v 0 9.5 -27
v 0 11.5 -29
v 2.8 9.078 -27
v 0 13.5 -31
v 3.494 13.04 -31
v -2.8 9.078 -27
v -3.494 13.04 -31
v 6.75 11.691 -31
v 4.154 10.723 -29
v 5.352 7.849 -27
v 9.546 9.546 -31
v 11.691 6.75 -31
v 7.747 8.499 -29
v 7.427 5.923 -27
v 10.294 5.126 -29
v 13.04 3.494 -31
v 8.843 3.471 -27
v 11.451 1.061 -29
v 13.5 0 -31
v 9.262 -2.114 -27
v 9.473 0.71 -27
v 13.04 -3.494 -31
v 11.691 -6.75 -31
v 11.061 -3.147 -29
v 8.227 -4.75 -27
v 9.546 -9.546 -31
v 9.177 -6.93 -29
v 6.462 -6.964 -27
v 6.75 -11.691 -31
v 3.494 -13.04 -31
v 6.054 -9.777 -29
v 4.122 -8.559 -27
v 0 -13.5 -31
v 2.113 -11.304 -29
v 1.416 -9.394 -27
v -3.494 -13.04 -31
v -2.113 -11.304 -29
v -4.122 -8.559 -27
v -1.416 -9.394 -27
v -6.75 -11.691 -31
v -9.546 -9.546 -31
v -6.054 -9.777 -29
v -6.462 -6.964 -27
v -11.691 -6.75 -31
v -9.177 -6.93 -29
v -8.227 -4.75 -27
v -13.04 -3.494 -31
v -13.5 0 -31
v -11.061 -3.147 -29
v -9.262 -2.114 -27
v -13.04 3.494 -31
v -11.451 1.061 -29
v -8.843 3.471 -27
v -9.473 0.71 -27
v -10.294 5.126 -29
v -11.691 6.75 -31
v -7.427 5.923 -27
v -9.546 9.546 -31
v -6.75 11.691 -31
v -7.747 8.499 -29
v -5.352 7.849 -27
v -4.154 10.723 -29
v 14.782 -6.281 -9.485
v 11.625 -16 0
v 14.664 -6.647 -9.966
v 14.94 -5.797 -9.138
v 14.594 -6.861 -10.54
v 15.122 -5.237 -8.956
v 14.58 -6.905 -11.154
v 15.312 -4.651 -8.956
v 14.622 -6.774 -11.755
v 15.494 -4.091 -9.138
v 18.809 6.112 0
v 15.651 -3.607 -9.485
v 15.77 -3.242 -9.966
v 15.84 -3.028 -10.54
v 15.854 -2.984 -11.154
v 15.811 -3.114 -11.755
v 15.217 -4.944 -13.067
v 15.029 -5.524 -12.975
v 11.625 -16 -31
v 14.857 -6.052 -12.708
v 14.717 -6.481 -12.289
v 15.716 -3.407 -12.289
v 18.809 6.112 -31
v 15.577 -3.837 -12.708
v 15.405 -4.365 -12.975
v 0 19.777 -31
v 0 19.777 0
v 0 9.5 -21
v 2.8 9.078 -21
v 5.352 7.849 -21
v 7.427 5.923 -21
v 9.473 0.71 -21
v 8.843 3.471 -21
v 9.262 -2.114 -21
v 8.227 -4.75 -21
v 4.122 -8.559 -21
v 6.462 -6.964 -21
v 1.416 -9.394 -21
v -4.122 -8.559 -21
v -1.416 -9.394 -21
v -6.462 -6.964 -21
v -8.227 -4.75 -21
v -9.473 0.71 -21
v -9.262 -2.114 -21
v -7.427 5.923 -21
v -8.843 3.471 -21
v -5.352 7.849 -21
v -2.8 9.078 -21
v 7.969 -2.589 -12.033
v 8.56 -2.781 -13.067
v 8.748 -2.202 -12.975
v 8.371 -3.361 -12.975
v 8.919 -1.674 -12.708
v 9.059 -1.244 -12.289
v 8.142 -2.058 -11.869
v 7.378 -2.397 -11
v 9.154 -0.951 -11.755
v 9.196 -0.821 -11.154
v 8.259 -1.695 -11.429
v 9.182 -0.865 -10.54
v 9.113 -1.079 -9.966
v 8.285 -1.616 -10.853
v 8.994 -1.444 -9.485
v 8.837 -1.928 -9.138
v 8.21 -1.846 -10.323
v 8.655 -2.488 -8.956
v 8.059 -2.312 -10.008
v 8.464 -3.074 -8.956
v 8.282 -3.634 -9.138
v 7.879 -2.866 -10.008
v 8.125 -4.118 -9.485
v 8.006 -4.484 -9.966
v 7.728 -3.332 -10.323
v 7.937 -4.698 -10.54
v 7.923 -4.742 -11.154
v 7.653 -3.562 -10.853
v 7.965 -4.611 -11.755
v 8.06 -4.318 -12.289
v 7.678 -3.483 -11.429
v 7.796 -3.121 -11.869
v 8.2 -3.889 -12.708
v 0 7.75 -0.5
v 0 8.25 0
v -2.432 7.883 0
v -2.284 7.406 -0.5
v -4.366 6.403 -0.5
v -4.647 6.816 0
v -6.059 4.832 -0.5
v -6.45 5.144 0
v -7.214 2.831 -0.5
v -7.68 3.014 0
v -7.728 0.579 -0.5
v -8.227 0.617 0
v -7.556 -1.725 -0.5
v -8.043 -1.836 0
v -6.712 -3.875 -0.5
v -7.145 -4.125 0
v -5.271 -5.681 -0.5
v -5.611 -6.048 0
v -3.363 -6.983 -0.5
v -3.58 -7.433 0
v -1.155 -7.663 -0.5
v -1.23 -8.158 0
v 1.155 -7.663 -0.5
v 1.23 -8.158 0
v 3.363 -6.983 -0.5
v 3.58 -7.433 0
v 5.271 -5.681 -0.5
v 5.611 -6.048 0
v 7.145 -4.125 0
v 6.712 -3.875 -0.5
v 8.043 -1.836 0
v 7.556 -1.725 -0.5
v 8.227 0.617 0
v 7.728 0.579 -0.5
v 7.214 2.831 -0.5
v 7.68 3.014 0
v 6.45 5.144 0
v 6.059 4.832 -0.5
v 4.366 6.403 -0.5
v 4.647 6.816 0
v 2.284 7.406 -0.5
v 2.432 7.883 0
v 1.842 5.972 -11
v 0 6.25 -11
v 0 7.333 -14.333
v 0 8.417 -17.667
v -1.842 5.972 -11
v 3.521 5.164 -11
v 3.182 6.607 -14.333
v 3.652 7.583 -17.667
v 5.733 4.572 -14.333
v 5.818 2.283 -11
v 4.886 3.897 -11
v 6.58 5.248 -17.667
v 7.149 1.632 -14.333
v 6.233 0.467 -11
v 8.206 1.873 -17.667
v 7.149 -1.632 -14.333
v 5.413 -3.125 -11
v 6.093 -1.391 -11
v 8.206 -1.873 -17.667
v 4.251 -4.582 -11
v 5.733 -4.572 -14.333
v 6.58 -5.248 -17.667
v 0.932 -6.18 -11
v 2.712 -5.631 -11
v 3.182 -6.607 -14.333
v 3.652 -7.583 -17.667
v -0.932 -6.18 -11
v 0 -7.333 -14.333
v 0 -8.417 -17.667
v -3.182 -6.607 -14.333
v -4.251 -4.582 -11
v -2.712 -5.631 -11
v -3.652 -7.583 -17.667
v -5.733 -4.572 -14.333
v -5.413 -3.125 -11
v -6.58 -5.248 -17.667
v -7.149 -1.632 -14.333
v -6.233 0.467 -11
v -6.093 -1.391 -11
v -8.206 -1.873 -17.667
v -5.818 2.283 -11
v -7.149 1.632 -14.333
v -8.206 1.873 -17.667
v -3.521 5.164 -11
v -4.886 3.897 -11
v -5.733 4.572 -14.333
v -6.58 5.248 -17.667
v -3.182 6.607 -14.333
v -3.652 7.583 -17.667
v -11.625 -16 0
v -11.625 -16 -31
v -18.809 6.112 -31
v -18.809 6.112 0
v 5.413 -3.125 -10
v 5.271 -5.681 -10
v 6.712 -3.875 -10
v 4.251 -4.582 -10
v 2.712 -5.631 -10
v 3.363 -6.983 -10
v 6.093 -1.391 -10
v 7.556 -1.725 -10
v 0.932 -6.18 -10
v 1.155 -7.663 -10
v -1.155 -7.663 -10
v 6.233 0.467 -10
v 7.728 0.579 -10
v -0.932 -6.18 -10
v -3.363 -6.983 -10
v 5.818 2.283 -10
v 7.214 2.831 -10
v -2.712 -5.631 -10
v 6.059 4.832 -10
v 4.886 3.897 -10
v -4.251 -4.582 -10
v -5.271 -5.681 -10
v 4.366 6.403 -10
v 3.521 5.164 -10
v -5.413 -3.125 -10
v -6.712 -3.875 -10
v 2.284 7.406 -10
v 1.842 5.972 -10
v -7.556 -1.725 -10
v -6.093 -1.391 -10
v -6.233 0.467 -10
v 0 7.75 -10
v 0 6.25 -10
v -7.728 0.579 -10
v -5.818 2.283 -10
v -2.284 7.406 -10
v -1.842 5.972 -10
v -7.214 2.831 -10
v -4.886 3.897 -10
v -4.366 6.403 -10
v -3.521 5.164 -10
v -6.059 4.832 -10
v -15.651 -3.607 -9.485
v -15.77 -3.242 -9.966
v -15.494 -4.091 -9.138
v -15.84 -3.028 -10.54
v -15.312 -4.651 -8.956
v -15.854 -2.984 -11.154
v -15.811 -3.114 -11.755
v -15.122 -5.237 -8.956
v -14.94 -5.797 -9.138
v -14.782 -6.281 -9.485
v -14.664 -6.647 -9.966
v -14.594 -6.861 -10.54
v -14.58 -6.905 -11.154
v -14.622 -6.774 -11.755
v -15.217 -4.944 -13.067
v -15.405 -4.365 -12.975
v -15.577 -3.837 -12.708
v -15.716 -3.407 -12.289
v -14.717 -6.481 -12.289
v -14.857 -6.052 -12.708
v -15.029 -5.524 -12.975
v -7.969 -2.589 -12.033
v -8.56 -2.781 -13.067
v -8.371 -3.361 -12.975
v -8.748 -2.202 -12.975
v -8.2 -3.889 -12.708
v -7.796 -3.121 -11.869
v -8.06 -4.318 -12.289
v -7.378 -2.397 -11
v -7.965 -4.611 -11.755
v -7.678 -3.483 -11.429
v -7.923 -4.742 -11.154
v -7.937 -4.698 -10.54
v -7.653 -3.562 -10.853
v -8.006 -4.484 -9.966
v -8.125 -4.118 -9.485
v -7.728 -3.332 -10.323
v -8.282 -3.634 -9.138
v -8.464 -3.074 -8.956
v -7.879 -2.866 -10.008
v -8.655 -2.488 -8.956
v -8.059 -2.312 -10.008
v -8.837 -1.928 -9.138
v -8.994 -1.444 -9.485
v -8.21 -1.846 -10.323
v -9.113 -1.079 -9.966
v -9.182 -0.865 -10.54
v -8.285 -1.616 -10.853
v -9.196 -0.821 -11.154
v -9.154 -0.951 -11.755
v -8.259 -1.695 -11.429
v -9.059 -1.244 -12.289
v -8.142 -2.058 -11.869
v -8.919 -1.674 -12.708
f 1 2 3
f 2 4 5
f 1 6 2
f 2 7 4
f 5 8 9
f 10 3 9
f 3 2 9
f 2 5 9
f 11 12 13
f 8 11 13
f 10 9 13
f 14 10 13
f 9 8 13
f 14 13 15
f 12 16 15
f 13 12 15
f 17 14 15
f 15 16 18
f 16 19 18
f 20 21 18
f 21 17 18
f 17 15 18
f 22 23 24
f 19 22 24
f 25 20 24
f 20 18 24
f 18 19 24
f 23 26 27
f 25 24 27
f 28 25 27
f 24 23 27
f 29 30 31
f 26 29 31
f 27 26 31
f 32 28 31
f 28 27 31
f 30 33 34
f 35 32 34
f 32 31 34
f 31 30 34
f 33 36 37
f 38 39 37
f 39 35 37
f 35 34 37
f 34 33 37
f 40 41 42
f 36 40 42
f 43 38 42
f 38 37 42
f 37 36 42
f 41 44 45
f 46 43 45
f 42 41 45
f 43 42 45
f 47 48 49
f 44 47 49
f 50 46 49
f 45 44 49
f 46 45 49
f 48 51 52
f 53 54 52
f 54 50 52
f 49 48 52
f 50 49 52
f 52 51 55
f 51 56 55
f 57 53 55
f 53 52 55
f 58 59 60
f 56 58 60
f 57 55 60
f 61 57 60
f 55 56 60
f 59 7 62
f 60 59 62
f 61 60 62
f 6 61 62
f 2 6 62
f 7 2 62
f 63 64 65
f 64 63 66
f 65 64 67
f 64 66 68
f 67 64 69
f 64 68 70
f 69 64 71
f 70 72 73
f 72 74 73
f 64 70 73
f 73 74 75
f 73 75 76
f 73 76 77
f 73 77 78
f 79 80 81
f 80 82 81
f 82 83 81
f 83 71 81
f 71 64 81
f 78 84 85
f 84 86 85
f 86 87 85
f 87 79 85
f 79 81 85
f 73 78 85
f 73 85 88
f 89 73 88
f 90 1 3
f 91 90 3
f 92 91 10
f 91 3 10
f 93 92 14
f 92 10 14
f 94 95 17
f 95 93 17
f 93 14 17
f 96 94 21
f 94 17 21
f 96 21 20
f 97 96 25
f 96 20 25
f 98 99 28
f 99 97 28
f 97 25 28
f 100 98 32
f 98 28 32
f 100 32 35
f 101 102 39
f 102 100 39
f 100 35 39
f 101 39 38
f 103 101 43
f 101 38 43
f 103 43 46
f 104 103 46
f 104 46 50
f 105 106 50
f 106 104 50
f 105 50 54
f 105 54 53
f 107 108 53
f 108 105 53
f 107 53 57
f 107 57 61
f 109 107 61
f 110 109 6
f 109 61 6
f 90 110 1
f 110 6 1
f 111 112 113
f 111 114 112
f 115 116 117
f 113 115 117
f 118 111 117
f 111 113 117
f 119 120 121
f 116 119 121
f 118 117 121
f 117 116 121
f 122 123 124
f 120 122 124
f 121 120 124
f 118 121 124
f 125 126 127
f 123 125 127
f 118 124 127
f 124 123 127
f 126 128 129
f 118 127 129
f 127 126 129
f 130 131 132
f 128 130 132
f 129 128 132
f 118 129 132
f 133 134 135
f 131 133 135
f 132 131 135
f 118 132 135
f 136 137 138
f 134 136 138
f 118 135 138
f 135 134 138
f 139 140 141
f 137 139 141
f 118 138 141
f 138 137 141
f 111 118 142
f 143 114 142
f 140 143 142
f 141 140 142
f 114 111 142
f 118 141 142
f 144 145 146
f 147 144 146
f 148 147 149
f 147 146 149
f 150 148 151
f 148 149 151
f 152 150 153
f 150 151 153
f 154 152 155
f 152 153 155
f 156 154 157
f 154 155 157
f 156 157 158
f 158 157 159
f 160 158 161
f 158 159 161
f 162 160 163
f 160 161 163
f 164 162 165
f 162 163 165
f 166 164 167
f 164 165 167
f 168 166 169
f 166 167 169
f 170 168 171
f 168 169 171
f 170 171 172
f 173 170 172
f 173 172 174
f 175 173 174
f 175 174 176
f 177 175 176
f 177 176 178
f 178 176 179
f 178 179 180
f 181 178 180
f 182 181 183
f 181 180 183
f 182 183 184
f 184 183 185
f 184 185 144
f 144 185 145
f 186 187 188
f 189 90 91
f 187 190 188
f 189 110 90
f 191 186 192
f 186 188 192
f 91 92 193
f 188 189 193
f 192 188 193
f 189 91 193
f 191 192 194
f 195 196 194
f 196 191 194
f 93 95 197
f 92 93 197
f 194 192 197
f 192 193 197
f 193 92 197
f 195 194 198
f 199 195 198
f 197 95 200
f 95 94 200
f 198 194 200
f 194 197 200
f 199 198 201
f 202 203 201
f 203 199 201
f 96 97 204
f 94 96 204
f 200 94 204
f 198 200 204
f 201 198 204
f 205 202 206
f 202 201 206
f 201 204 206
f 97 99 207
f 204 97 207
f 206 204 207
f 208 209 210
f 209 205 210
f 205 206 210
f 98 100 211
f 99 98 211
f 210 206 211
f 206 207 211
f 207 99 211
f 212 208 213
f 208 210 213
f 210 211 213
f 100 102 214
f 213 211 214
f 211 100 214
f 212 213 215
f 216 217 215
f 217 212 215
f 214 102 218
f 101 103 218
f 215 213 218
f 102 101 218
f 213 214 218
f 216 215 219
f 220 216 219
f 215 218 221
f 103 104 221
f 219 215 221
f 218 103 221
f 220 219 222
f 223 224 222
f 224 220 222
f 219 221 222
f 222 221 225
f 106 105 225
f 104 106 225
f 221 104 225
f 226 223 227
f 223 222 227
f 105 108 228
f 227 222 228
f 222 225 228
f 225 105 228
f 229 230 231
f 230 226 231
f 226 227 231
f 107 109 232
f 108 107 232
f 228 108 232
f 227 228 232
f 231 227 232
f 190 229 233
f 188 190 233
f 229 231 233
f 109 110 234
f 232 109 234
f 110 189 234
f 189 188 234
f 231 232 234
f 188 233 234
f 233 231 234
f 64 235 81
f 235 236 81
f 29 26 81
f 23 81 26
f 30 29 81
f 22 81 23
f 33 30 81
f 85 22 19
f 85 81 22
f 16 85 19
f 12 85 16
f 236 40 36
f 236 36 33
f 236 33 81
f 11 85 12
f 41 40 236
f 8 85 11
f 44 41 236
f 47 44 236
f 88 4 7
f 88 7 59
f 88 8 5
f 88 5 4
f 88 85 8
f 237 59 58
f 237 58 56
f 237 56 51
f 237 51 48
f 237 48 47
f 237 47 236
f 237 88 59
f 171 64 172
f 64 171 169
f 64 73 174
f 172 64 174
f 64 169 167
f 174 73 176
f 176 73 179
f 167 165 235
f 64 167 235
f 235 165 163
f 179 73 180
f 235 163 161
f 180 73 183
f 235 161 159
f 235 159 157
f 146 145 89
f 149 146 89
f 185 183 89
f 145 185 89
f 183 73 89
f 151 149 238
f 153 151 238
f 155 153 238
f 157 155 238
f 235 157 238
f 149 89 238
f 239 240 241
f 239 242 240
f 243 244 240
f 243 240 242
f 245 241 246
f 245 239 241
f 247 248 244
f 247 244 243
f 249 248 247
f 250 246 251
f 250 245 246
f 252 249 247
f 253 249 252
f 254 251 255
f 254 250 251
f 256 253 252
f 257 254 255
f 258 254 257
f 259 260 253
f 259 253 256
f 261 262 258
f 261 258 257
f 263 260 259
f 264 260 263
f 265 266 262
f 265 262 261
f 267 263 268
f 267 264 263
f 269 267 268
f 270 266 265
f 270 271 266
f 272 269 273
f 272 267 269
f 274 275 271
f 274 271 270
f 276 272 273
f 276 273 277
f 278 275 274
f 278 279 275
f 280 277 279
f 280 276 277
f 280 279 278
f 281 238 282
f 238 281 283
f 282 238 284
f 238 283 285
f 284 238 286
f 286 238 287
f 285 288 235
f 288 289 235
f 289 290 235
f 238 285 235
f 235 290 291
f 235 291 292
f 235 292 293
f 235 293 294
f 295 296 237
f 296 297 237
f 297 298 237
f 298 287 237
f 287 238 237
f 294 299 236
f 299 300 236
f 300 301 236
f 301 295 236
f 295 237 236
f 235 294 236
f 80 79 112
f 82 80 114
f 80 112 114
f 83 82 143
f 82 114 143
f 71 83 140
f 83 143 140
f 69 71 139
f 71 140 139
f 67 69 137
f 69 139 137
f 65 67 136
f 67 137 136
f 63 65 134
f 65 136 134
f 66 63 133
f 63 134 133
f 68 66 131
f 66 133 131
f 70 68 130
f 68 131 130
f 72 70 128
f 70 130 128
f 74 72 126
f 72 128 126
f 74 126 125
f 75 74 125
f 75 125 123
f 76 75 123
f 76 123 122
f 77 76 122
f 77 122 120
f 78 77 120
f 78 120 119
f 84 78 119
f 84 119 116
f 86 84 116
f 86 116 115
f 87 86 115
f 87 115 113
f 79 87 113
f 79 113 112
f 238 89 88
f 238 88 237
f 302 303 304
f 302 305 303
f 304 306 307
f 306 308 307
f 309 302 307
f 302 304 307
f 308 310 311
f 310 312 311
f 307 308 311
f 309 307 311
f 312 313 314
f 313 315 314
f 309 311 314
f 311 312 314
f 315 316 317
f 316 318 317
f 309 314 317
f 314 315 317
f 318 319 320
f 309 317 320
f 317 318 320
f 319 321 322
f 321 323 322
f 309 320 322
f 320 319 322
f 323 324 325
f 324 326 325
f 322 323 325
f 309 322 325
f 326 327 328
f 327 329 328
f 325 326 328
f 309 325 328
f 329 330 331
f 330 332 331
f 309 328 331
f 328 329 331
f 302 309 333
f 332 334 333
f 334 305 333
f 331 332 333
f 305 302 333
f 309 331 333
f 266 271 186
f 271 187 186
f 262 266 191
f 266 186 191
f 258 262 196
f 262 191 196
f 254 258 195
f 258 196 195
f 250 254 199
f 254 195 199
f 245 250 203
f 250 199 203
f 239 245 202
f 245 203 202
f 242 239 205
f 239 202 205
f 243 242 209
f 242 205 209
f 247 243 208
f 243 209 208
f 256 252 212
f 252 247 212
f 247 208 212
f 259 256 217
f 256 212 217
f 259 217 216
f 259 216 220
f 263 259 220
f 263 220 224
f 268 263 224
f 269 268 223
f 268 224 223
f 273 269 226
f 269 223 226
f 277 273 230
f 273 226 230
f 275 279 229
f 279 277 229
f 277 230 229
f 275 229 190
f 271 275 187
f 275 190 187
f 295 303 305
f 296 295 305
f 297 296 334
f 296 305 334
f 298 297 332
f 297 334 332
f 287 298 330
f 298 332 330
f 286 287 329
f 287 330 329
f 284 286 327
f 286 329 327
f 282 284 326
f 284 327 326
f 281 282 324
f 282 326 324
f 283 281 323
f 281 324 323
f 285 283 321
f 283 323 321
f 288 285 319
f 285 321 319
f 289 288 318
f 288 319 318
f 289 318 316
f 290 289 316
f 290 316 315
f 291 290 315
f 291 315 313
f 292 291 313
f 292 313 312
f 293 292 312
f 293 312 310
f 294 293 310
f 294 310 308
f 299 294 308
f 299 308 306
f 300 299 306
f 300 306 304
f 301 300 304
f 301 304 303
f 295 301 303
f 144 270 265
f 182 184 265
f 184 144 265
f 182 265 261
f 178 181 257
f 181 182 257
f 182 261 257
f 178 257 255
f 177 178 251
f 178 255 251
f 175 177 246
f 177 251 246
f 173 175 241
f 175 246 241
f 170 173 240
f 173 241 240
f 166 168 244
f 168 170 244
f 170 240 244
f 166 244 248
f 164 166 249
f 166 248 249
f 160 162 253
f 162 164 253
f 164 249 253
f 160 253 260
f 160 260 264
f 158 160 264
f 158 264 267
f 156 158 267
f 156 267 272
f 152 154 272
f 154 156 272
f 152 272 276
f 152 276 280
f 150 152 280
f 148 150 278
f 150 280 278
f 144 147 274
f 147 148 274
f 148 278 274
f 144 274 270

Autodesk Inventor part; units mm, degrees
ref_plane "YZ Plane" through (0, 0, 0) normal (1, 0, 0) x (0, 1, 0)
ref_plane "XZ Plane" through (0, 0, 0) normal (0, 1, 0) x (-1, 0, 0)
ref_plane "XY Plane" through (0, 0, 0) normal (0, 0, 1) x (1, 0, 0)
sketch "Esquisse2" plane through (0, 0, 0) normal (1, 0, 0) x (0, 1, 0)
  line L0 (6.25, -10) -> (6.25, -11)
  line L1 (6.25, -11) -> (9.5, -21)
  line L2 (9.5, -21) -> (9.5, -31)
  line L3 (0, -252.0623) -> (0, 0)
  line L4 (9.5, -31) -> (12.5, -31)
  line L5 (12.5, -31) -> (12.5, 0)
  line L6 (6.25, -10) -> (7.75, -10)
  line L7 (12.5, 0) -> (7.75, 0)
  line L8 (7.75, 0) -> (7.75, -10)
  dimension "d1" = 10
  dimension "d4" = 12.5
  dimension "d6" = 3
  dimension "d8" = 1.5
  dimension "d11" = 19
  dimension "d12" = 20
  dimension "d15" = 25
  dimension "d16" = 1
  dimension "d17" = 10
  dimension "d22" = 15.5
revolve "Révolution1" add sketch "Esquisse2" angle 360 about axis through (0, 0, -252.0623) along (0, 0, 1)
thread "Filetage3" size "M16x1.5" class "6H" standard "ISO Metric profile" full length
chamfer "Chanfrein1" distance 0.5 angle 45 1 edges at (0, -7.75, 0)
sketch "Esquisse7" plane through (0, 0, -31) normal (0, 0, -1) x (-1, 0, 0)
  line L0 (-11.6247, -16) -> (-18.8091, 6.1115)
  line L1 (-18.8091, 6.1115) -> (0, 19.7771)
  line L2 (0, 19.7771) -> (18.8091, 6.1115)
  line L3 (18.8091, 6.1115) -> (11.6247, -16)
  line L4 (11.6247, -16) -> (-11.6247, -16)
  circle A0 centre (0, 0) radius 12.5 projected
  circle A1 centre (0, 0) radius 9.5 projected
  dimension "d44" = 16
extrude "Extrusion5" add sketch "Esquisse7" against normal up to surface (31 mm away) contours L0 L1 L2 L3 L4
sketch "Esquisse8" plane through (11.6247, -16, 0) normal (0.9511, -0.309, 0) x (0, 0, -1)
  line L0 (21, 2.1247) -> (21, 21.1247) projected
  line L1 (11, 5.3747) -> (11, 17.8747) projected
  line L2 (10, 5.3747) -> (10, 17.8747) projected
  point P0 (0, 11.6247)
  point P1 (11, 11.6247)
  point P2 (11, 11.6247)
hole "Perçage2" at (15.2169, -4.9443, -11) direction (-0.9511, 0.309, 0) diameter 4.134 depth 7 tip angle 118 thread size "M5x0.8" class "6H" standard "ISO Metric profile"
mirror "Symétrie1" about plane through (0, 0, 0) normal (1, 0, 0) of "Perçage2"
chamfer "Chanfrein2" distance 4 angle 45 1 edges at (0, -9.5, -31)
properties part number "ammo_blocker"
